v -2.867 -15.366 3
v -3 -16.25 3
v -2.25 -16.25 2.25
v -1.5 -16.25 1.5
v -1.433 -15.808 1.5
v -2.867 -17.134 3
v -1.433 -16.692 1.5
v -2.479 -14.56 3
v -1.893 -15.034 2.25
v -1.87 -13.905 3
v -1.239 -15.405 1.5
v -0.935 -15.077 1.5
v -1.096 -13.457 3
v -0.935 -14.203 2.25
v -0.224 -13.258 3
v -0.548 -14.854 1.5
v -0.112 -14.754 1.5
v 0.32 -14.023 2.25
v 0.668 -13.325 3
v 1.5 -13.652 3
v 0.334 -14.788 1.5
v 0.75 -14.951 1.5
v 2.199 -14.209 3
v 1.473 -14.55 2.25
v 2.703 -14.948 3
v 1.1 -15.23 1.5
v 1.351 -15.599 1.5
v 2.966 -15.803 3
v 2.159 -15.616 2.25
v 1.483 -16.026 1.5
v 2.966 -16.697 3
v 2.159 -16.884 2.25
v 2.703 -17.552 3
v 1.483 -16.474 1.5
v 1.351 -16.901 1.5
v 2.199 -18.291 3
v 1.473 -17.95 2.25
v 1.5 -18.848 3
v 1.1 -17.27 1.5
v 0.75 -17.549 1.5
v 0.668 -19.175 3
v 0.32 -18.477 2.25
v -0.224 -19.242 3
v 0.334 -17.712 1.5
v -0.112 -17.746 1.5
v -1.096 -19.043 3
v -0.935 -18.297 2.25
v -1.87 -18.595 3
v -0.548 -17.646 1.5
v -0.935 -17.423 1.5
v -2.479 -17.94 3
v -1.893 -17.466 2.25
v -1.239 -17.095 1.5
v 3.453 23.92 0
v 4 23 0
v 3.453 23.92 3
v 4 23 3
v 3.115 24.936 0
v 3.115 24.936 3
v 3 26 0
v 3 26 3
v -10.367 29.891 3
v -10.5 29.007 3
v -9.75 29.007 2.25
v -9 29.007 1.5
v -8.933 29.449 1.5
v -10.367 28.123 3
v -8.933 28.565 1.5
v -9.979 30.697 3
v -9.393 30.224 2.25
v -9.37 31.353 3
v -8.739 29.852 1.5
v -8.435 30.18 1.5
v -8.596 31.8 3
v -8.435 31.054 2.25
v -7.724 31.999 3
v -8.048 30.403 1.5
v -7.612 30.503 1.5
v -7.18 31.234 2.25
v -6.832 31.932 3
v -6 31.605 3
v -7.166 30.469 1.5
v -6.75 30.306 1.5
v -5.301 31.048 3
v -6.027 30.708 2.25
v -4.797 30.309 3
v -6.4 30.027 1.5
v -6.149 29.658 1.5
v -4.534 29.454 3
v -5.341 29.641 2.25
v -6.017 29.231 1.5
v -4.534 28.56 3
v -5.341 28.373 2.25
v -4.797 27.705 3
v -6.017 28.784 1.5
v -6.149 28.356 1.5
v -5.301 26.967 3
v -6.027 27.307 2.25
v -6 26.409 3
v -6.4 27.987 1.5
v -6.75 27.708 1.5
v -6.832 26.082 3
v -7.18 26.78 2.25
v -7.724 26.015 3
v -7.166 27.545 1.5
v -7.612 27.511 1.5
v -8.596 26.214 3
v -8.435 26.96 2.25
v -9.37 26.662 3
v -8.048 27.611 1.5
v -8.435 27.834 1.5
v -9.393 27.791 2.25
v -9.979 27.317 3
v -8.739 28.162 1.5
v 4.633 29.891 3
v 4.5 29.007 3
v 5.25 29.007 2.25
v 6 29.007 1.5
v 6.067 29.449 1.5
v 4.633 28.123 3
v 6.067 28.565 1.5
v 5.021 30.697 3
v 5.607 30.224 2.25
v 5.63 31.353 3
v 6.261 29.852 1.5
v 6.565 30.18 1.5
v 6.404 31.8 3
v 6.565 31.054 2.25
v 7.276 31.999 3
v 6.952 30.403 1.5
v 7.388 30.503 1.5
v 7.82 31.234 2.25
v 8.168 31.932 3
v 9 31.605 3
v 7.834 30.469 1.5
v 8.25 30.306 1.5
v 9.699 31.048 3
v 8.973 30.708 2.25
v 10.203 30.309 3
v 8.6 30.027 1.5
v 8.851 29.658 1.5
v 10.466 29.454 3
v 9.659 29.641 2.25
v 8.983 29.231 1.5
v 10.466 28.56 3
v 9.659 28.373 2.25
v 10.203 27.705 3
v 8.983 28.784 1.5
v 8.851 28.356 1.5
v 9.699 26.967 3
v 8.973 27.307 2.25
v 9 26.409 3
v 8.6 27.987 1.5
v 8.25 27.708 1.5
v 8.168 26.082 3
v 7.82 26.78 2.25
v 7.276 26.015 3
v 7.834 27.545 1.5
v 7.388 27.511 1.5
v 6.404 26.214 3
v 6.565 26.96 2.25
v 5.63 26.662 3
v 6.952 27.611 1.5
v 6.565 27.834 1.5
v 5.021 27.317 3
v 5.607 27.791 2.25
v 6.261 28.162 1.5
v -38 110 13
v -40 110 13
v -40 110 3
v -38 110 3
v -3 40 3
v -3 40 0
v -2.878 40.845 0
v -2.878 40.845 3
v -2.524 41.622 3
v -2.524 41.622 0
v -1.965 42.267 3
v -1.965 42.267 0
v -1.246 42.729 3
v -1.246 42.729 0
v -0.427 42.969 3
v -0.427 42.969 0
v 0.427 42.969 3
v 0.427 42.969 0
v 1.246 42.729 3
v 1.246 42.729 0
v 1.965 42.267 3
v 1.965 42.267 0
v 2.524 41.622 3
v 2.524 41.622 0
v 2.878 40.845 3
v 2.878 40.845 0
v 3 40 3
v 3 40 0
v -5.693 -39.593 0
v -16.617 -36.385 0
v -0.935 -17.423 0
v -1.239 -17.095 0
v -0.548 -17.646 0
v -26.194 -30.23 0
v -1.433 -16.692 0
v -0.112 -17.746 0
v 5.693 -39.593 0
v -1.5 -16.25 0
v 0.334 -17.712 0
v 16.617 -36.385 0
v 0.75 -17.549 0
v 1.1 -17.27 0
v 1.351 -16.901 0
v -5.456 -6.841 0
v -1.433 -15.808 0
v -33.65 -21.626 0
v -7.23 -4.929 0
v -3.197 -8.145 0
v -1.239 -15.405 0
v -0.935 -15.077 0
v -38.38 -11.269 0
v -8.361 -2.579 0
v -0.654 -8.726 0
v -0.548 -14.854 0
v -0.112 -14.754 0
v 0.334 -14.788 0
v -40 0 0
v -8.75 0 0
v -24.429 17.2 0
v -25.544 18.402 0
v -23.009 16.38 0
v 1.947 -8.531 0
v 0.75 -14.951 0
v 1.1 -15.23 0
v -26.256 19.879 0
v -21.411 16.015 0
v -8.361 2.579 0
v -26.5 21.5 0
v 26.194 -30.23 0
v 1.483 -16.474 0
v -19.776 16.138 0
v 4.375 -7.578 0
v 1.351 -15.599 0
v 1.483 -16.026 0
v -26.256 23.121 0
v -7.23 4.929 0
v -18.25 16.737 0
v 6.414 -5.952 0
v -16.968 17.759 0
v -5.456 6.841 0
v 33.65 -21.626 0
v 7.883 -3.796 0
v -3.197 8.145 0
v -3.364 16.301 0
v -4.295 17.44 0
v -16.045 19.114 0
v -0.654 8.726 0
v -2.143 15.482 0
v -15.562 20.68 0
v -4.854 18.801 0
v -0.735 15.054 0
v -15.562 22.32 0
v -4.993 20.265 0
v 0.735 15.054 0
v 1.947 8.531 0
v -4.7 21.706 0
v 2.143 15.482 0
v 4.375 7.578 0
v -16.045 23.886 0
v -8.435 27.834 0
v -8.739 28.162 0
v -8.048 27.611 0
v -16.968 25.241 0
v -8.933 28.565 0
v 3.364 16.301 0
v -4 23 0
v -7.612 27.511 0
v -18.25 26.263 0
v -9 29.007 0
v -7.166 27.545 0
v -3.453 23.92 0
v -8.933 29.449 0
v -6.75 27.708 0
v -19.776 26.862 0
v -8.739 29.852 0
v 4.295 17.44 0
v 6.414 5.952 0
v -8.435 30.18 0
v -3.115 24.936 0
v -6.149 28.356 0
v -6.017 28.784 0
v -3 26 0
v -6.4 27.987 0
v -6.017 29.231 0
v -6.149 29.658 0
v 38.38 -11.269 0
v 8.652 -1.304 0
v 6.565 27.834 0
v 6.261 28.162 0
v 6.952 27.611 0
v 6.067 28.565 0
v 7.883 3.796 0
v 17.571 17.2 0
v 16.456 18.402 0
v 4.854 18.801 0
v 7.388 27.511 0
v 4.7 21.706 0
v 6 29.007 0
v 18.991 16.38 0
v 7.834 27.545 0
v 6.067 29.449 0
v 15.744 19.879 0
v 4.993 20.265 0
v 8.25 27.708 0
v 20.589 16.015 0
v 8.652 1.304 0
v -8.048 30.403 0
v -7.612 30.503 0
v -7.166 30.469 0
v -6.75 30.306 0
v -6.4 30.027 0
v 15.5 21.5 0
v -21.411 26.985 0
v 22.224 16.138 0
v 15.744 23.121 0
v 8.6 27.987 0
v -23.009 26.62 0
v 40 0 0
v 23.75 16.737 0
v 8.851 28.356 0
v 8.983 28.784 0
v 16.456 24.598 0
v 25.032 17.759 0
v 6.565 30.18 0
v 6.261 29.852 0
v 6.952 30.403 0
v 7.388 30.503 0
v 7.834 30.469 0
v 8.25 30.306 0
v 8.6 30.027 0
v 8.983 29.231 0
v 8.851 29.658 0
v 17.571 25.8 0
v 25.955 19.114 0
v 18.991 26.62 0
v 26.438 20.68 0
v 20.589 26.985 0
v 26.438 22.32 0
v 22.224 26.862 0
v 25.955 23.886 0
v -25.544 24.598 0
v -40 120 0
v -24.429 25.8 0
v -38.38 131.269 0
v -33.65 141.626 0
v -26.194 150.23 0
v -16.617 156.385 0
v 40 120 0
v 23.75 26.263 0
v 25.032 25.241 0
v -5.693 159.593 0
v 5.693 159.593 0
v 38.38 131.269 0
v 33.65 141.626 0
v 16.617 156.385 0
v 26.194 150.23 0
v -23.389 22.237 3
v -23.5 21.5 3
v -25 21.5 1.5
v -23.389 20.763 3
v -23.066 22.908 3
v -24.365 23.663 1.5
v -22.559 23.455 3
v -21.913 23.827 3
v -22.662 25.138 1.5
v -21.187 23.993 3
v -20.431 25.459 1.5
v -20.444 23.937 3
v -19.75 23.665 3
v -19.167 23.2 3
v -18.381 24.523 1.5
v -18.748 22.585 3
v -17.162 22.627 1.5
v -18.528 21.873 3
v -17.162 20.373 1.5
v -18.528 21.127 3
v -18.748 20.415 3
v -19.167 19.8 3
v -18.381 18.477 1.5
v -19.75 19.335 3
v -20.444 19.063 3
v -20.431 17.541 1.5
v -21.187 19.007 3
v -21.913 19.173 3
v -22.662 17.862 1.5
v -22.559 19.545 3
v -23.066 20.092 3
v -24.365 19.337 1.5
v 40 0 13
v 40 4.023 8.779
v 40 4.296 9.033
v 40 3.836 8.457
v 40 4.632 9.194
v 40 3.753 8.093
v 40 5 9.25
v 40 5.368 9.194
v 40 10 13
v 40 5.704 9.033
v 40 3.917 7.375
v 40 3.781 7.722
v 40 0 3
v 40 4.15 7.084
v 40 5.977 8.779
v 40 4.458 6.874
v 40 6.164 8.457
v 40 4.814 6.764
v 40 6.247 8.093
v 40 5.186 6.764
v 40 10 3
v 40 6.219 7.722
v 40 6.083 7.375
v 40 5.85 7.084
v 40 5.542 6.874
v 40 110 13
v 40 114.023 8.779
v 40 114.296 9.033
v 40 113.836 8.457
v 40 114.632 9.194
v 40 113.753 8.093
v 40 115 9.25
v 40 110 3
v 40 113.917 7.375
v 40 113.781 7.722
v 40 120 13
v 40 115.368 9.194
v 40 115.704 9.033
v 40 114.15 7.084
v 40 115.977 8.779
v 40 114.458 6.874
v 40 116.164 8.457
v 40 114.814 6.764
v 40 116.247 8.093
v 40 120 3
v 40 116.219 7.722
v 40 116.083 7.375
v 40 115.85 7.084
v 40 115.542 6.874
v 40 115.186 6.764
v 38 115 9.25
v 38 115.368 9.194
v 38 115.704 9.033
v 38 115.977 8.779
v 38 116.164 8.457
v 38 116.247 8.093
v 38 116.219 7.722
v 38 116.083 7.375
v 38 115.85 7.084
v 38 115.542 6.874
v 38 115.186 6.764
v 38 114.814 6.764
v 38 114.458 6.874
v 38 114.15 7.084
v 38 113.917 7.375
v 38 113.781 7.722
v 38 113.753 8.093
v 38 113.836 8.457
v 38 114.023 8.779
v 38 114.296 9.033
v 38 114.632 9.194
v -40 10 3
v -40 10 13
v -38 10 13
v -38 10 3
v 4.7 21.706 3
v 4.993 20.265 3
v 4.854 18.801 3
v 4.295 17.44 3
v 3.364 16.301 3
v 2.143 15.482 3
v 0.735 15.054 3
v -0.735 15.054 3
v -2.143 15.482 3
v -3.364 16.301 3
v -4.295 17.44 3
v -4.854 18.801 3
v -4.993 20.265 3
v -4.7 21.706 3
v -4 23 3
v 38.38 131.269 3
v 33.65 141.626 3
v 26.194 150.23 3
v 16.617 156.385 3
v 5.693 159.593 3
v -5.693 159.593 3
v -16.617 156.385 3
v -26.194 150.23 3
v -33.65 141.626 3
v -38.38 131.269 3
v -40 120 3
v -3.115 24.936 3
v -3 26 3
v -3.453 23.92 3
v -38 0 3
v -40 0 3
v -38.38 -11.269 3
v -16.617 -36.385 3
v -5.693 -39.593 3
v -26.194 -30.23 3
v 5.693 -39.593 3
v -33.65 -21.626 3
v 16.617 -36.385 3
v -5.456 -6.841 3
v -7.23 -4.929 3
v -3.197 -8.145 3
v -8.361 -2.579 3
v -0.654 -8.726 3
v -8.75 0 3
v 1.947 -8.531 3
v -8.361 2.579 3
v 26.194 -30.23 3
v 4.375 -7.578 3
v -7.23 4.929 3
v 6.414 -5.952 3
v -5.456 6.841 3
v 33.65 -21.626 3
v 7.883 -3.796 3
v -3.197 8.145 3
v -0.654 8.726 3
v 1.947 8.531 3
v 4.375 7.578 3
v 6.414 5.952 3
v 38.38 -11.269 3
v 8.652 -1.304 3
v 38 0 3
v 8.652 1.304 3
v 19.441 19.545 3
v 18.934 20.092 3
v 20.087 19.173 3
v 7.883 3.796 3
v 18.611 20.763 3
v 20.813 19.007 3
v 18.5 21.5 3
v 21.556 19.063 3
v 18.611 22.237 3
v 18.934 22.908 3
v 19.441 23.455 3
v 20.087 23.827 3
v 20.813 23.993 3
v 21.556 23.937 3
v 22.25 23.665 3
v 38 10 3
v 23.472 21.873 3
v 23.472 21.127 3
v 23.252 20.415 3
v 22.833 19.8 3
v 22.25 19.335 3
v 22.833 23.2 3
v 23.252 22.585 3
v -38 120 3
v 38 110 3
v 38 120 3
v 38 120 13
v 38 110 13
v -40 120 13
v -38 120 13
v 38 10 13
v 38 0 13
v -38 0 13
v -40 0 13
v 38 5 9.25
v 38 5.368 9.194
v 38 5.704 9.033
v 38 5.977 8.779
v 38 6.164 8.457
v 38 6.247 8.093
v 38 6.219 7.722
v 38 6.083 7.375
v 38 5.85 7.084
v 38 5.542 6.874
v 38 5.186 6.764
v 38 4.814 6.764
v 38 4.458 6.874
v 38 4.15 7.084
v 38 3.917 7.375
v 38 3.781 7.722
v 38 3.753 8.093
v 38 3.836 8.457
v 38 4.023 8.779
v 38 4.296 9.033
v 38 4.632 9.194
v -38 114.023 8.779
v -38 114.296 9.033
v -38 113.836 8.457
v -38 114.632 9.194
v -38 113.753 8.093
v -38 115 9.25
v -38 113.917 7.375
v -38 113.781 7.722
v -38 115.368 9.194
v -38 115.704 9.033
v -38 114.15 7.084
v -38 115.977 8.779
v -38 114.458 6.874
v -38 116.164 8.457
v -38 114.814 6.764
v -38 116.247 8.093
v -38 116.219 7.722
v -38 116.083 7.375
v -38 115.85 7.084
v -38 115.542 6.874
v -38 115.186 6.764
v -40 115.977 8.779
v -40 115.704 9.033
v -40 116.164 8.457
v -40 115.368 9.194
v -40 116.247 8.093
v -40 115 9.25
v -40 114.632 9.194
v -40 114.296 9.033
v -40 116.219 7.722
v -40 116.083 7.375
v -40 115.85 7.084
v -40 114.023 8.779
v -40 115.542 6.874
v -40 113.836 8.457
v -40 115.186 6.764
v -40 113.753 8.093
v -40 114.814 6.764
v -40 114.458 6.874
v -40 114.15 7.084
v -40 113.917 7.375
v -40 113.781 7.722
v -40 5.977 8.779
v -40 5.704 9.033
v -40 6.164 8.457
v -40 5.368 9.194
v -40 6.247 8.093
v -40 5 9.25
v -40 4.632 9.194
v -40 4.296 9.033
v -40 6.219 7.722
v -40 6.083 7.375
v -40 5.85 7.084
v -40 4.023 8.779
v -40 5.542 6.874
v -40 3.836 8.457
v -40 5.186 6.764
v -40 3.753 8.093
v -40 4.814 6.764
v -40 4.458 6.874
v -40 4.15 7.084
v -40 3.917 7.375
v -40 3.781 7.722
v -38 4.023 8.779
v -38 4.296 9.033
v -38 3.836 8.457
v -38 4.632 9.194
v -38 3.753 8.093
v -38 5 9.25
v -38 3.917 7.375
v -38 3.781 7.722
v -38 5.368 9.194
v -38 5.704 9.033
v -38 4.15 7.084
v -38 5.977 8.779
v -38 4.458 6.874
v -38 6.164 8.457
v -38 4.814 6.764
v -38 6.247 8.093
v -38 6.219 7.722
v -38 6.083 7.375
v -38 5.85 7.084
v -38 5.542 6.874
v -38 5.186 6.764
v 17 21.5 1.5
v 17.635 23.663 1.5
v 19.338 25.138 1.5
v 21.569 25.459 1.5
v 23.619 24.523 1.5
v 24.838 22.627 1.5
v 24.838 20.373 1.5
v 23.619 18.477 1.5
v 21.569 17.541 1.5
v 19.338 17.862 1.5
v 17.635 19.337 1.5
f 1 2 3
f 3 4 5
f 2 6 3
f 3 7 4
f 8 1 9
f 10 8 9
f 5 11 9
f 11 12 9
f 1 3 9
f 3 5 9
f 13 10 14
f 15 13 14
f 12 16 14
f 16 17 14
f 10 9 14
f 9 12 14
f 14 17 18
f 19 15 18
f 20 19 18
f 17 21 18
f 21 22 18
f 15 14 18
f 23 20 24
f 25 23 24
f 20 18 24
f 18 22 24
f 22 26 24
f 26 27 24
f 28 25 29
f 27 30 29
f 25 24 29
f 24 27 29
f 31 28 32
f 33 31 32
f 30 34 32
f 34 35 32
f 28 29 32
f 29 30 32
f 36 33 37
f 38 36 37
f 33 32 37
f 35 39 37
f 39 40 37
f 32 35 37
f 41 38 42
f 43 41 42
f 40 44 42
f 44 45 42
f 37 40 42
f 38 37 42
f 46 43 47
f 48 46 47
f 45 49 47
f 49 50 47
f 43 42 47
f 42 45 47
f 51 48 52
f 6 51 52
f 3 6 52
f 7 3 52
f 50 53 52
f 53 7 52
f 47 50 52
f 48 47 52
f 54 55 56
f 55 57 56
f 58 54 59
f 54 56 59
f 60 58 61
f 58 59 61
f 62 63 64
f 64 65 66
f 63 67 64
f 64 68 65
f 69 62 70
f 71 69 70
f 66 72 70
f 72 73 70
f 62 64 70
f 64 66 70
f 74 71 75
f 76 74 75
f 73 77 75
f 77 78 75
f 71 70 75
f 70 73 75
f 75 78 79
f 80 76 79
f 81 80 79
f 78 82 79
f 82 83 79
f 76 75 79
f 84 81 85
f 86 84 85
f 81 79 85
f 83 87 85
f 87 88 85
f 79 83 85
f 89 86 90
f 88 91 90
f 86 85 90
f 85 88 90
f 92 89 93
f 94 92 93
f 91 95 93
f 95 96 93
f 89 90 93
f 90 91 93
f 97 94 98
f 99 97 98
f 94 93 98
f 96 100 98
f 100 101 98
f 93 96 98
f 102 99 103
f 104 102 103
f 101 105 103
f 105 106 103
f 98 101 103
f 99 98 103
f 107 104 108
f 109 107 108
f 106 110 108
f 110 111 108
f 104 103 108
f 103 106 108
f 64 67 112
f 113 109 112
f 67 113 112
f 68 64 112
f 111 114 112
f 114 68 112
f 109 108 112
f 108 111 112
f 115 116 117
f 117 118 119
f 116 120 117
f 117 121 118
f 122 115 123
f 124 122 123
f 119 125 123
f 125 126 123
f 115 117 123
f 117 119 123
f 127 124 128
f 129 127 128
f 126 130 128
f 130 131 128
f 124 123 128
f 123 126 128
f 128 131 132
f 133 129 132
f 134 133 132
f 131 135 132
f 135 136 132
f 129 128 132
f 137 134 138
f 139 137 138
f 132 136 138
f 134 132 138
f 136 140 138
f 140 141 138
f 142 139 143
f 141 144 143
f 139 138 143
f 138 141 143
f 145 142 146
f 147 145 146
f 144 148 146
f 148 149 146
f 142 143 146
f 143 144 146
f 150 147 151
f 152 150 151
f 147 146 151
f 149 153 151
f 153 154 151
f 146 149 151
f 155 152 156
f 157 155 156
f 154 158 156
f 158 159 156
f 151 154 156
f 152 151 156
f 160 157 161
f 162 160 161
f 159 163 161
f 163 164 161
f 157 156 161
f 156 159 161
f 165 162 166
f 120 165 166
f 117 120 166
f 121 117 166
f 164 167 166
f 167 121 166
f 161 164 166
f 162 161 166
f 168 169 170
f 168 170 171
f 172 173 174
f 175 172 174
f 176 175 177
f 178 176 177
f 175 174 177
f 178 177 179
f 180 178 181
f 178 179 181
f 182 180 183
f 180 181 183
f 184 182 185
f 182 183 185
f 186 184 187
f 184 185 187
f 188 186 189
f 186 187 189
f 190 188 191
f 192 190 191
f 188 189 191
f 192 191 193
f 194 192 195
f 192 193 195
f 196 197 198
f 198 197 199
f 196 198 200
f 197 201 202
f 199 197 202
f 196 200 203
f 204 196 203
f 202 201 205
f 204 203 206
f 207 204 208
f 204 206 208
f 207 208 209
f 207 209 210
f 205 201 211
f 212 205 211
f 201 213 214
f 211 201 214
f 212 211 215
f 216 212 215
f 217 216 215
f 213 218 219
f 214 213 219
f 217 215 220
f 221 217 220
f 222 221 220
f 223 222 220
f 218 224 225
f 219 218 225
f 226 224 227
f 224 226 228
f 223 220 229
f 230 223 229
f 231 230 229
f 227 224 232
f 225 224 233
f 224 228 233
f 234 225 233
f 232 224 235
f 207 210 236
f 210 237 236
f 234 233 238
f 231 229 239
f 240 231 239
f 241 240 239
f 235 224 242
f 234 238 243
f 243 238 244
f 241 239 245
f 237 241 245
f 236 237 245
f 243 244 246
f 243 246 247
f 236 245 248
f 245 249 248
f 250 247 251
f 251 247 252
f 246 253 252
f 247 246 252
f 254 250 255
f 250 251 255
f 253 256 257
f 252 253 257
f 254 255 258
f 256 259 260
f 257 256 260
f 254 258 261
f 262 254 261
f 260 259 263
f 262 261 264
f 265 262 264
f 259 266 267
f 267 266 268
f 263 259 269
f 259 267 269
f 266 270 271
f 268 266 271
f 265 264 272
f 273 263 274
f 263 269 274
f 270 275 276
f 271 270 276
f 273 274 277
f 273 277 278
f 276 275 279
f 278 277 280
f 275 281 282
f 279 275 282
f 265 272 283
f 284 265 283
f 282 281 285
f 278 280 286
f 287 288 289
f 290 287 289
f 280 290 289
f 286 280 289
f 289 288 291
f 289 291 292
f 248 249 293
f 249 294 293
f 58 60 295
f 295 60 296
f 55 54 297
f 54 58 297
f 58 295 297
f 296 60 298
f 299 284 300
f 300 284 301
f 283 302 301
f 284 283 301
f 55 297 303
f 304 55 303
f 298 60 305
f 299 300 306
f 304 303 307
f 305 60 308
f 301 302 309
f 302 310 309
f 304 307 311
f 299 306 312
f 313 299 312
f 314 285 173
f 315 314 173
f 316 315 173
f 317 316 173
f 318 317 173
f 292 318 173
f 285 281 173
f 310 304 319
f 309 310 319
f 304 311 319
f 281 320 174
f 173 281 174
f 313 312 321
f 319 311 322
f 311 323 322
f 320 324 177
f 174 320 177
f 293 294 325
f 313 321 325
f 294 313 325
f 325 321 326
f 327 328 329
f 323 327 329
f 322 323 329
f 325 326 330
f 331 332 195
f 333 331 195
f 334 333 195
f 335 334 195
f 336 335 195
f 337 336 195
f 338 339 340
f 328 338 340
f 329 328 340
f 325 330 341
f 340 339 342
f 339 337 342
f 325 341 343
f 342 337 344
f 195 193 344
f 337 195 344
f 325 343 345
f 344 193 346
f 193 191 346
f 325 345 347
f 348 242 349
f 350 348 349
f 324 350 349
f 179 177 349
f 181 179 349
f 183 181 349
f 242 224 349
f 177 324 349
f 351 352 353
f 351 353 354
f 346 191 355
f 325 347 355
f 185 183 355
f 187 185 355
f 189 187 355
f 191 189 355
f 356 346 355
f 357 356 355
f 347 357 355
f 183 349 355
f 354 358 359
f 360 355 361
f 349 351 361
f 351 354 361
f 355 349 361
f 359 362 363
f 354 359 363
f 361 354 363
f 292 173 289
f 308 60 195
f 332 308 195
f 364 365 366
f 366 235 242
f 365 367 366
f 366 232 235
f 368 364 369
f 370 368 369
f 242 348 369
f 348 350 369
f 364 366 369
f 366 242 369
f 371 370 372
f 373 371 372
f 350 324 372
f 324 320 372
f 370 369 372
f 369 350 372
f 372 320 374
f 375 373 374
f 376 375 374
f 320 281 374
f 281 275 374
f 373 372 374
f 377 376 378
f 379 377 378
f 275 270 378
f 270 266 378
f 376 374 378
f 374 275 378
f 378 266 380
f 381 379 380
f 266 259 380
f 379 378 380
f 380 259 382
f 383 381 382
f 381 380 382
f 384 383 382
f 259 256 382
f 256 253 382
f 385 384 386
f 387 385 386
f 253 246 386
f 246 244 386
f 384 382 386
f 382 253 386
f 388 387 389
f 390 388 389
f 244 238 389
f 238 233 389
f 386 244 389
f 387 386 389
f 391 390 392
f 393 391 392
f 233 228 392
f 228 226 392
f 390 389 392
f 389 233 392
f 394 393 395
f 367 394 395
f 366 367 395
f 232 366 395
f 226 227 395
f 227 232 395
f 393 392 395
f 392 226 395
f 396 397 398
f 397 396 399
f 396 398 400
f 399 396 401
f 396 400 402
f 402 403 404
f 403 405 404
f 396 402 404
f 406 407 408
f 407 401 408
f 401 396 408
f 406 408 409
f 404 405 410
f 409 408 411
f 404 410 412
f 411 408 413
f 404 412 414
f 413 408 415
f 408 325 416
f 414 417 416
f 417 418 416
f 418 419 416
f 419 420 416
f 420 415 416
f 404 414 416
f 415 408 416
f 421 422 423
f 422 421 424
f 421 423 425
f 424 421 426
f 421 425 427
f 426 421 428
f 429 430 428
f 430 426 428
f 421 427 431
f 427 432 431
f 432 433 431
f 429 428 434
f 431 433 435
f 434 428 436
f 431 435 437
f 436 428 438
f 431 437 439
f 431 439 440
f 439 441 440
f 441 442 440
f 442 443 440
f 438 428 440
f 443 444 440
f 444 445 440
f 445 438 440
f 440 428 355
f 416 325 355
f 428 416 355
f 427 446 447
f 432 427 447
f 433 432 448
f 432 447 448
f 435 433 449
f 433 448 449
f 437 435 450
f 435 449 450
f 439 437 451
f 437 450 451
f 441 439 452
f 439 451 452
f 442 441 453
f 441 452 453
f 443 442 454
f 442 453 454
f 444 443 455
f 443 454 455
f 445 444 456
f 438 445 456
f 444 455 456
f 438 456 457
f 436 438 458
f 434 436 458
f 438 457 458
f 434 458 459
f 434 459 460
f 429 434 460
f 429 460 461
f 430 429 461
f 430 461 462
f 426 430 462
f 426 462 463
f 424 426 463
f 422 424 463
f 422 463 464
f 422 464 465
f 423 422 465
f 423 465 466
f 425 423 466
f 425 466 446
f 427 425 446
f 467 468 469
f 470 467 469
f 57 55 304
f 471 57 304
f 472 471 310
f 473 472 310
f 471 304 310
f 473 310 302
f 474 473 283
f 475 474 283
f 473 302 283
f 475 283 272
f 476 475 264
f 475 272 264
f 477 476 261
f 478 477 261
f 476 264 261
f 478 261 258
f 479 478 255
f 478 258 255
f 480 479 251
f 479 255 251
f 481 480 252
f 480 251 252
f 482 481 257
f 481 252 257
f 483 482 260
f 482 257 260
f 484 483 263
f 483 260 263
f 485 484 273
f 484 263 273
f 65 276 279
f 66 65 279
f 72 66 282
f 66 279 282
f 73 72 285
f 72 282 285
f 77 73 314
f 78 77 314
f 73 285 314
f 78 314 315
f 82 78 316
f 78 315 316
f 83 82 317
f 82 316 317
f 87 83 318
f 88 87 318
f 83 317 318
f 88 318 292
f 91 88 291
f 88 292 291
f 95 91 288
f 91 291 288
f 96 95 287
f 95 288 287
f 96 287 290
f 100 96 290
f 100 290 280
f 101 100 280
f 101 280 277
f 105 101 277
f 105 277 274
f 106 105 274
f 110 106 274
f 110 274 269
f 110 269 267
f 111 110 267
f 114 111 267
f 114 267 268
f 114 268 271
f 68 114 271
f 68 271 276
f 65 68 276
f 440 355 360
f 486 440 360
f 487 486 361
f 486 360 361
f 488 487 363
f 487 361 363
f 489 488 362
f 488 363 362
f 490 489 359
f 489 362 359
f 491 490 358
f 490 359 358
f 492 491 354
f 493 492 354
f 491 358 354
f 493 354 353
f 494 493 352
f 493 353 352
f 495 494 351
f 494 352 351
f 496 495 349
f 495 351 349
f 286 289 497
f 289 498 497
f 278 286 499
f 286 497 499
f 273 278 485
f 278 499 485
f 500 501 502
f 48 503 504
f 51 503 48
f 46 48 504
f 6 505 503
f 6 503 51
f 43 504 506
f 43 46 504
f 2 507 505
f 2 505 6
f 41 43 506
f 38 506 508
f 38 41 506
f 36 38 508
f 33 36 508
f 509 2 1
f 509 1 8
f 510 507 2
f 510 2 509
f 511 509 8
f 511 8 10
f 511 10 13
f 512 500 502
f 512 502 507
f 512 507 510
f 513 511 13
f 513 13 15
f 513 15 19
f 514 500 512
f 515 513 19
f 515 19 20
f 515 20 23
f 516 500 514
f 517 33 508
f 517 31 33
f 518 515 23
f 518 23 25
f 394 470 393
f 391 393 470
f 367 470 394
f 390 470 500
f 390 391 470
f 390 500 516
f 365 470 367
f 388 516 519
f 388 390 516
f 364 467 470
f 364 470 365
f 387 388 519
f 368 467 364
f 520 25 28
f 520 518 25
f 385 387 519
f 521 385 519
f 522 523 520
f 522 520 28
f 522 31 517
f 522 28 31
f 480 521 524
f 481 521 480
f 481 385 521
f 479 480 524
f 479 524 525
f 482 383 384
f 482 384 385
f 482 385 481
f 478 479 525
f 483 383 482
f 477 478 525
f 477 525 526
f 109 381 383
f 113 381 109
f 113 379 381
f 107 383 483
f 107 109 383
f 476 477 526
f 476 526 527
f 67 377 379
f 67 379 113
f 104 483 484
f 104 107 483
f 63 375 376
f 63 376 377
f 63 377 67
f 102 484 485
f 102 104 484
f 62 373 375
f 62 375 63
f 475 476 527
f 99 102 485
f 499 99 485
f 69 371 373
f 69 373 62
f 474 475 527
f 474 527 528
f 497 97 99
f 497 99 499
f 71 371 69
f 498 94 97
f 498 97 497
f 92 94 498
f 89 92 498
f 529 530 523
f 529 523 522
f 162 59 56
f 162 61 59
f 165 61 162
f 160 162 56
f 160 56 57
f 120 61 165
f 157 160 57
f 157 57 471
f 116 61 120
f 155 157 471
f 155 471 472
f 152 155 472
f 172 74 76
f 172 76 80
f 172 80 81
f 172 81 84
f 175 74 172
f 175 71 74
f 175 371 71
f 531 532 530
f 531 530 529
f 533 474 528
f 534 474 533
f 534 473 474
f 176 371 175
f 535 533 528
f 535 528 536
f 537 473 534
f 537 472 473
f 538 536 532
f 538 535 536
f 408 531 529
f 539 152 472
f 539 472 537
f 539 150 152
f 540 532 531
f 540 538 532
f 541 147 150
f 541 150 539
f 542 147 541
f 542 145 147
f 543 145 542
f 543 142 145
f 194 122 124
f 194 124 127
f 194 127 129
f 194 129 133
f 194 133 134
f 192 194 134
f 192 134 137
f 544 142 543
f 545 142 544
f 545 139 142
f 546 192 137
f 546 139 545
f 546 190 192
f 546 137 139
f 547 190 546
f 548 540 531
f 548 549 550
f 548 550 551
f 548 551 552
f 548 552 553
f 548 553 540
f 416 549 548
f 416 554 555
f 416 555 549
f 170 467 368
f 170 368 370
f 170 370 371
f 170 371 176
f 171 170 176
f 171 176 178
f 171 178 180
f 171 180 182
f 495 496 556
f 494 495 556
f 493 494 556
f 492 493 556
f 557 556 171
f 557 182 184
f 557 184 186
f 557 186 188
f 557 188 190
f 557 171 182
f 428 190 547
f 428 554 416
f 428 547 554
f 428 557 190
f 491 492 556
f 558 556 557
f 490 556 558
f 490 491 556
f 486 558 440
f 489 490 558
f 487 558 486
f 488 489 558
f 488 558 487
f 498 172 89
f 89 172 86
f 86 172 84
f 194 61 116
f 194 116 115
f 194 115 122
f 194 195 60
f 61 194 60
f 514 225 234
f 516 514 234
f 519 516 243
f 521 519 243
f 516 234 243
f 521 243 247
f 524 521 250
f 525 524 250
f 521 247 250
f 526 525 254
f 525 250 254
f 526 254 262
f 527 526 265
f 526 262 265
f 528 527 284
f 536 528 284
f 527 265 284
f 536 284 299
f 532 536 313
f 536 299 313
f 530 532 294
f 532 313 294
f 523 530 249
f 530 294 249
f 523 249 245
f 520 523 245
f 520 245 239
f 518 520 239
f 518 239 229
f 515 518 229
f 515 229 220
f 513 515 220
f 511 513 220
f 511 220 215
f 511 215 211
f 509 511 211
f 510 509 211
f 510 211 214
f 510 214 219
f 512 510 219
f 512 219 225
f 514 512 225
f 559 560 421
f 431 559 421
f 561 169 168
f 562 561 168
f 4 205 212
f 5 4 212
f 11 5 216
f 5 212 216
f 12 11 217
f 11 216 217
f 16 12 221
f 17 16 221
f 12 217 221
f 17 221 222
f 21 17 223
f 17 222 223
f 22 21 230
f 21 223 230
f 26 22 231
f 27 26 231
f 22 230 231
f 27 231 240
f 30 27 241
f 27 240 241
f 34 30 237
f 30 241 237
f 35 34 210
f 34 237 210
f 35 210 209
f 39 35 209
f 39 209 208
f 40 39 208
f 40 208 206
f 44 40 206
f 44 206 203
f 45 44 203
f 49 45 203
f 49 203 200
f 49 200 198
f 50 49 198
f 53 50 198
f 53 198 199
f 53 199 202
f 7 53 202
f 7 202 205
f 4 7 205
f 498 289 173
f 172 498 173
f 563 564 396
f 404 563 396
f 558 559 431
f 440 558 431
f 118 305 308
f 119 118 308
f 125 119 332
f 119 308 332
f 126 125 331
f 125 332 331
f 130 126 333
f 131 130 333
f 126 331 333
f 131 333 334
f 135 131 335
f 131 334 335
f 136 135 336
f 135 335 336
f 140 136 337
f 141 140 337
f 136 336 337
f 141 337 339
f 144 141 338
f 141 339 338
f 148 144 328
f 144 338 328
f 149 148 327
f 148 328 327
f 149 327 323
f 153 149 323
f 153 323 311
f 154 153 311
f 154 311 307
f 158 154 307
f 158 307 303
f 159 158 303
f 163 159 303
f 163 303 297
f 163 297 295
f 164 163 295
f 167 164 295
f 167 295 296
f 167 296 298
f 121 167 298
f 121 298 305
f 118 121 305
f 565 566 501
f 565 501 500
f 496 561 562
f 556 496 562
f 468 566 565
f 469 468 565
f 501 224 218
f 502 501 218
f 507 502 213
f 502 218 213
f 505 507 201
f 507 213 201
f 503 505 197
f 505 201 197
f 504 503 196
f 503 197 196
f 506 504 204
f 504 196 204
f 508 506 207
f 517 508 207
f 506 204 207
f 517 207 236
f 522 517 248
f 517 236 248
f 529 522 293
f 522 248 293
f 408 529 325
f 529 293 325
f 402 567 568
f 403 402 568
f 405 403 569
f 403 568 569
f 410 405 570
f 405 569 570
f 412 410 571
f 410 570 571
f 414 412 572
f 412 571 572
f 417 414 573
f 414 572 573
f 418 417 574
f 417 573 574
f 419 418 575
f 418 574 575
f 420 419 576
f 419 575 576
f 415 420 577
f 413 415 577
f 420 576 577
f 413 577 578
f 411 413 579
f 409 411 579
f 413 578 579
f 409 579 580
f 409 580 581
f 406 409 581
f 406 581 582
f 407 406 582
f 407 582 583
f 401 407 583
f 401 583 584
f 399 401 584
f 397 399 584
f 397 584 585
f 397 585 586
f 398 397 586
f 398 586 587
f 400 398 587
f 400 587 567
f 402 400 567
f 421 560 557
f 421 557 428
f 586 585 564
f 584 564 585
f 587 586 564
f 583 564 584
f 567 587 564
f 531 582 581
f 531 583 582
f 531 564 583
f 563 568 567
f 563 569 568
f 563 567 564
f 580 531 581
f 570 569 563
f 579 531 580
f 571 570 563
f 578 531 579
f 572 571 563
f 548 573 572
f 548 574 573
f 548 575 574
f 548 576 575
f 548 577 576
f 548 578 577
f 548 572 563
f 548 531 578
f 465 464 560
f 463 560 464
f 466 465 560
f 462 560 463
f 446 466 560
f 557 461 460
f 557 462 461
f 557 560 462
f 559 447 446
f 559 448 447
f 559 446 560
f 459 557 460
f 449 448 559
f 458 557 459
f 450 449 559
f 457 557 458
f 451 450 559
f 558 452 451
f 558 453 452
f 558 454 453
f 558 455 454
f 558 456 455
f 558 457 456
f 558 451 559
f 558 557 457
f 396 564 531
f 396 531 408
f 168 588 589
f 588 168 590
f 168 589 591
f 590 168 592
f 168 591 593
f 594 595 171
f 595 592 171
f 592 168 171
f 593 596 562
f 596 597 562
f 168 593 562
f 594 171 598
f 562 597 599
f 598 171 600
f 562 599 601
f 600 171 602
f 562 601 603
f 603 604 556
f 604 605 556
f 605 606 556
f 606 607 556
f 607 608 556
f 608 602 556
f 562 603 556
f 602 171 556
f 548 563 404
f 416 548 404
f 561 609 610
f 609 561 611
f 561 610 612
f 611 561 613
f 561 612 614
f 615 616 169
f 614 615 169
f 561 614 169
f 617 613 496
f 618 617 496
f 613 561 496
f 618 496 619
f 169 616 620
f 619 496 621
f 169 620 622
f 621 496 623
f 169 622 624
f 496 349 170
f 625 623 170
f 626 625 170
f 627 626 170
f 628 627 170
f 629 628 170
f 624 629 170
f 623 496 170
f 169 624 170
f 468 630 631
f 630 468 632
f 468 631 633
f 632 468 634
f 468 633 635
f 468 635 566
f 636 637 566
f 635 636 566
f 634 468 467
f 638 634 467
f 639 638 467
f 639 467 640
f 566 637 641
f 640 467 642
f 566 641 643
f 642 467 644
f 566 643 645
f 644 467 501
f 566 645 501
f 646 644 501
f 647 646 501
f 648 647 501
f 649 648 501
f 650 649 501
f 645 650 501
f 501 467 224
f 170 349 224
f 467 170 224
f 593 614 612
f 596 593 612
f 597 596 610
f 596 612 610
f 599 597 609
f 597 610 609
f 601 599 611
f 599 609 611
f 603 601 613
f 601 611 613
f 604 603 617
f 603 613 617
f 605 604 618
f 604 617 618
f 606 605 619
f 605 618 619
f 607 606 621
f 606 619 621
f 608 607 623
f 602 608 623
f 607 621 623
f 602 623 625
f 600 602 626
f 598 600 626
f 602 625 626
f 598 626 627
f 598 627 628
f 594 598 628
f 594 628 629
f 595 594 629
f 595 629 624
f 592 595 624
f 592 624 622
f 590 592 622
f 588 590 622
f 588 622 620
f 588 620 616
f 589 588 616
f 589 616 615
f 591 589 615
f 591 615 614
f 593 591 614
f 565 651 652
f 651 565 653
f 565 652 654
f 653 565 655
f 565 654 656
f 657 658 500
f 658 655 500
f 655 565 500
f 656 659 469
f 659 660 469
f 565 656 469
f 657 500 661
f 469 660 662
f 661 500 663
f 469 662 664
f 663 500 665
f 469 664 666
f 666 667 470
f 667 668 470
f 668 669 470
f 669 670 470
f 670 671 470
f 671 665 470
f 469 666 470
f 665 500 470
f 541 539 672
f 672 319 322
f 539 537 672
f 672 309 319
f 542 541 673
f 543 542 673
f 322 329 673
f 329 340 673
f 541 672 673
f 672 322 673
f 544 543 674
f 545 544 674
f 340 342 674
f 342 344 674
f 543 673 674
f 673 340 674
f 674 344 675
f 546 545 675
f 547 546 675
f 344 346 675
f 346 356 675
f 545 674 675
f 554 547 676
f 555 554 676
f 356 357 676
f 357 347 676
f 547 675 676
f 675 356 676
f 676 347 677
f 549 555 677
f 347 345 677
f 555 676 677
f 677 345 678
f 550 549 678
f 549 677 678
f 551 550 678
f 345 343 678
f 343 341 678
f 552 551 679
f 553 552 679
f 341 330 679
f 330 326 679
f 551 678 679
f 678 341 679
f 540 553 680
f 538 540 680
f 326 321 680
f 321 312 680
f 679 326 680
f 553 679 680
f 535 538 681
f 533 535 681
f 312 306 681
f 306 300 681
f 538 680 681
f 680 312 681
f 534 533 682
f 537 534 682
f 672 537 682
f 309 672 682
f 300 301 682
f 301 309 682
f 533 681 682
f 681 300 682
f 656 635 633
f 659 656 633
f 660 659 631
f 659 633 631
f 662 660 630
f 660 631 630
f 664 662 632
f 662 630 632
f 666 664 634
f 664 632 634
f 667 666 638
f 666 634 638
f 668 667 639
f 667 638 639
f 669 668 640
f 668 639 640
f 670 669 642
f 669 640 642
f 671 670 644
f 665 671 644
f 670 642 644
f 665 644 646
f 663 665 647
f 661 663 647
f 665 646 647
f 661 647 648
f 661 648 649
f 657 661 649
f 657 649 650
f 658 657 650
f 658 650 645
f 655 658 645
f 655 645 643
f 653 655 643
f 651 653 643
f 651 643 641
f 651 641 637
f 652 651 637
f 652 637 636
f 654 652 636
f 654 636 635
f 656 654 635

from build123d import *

# Parameters (mm, degrees)
SKETCH3_R           = 40
BOSS_EXTRUDE4_DEPTH = 3
SKETCH6_R           = 1.5
SKETCH6_R_2         = 8.75
CUT_EXTRUDE2_DEPTH  = 165.951508026
CHAMFER1_SIZE       = 1.5
SKETCH12_W          = 2
SKETCH12_H          = 10
BOSS_EXTRUDE7_DEPTH = 10
SKETCH13_R          = 1.25
CUT_EXTRUDE8_DEPTH  = 180.357185527
SKETCH14_R          = 2.5
CUT_EXTRUDE9_DEPTH  = 166.435788148
CHAMFER2_SIZE       = 3
CUT_EXTRUDE10_DEPTH = 166.435788148
FILLET1_R           = 5


with BuildPart() as part:
    # Sketch3 → Boss-Extrude4 (new body)
    with BuildSketch(Plane.XY):
        with BuildLine():
            ThreePointArc((40, 0), (0, 40), (-40, 0))
            Line((-40, 0), (40, 0))
        make_face()
        with BuildLine():
            Line((40, 0), (-40, 0))
            ThreePointArc((-40, 0), (0, -40), (40, 0))
        make_face()
        with BuildLine():
            Line((-40, 120), (-40, 0))
            ThreePointArc((-40, 0), (0, 40), (40, 0))
            Line((40, 0), (40, 120))
            ThreePointArc((40, 120), (0, 80), (-40, 120))
        make_face()
        with Locations((0, 120)):
            Circle(SKETCH3_R)
    extrude(amount=BOSS_EXTRUDE4_DEPTH)

    # Sketch6 → Cut-Extrude2 (cut, through all)
    with BuildSketch(Plane(origin=(0, 0, 0), x_dir=(-1, 0, 0), z_dir=(0, 0, -1))):
        with Locations((-7.5, 29.007101127)):
            Circle(SKETCH6_R)
        with Locations((7.5, 29.007101127)):
            Circle(SKETCH6_R)
        with Locations((0, -16.25)):
            Circle(SKETCH6_R)
        Circle(SKETCH6_R_2)
    extrude(amount=-CUT_EXTRUDE2_DEPTH, mode=Mode.SUBTRACT)

    # Chamfer1
    chamfer1_edges = [part.edges().sort_by_distance(p)[0] for p in [
        (-6, 29.007101127, 3),
        (1.5, -16.25, 3),
        (9, 29.007101127, 3),
    ]]
    chamfer(chamfer1_edges, length=CHAMFER1_SIZE)

    # Sketch12 → Boss-Extrude7 (add)
    with BuildSketch(Plane.XY.offset(3)):
        with Locations((39, 115)):
            Rectangle(SKETCH12_W, SKETCH12_H)
        with Locations((-39, 115)):
            Rectangle(SKETCH12_W, SKETCH12_H)
        with Locations((-39, 5)):
            Rectangle(SKETCH12_W, SKETCH12_H)
        with Locations((39, 5)):
            Rectangle(SKETCH12_W, SKETCH12_H)
    extrude(amount=BOSS_EXTRUDE7_DEPTH)

    # Sketch13 → Cut-Extrude8 (cut, through all)
    with BuildSketch(Plane.ZY.offset(40)):
        with Locations((8, 115)):
            Circle(SKETCH13_R)
        with Locations((8, 5)):
            Circle(SKETCH13_R)
    extrude(amount=-CUT_EXTRUDE8_DEPTH, mode=Mode.SUBTRACT)

    # Sketch14 → Cut-Extrude9 (cut, through all)
    with BuildSketch(Plane(origin=(0, 0, 0), x_dir=(-1, 0, 0), z_dir=(0, 0, -1))):
        with Locations((-21, 21.5)):
            Circle(SKETCH14_R)
        with Locations((21, 21.5)):
            Circle(SKETCH14_R)
    extrude(amount=-CUT_EXTRUDE9_DEPTH, mode=Mode.SUBTRACT)

    # Chamfer2
    chamfer2_edges = [part.edges().sort_by_distance(p)[0] for p in [
        (23.5, 21.5, 0),
        (-18.5, 21.5, 0),
    ]]
    chamfer(chamfer2_edges, length=CHAMFER2_SIZE - 0.0001)  # a hair under: the kernel refuses the full size

    # Sketch9 → Cut-Extrude10 (cut, through all)
    with BuildSketch(Plane(origin=(0, 0, 0), x_dir=(-1, 0, 0), z_dir=(0, 0, -1))):
        with BuildLine():
            ThreePointArc((3, 40), (0, 43), (-3, 40))
            Line((-3, 40), (-3, 24))
            ThreePointArc((-3, 24), (0, 15), (3, 24))
            Line((3, 24), (3, 40))
        make_face()
    extrude(amount=-CUT_EXTRUDE10_DEPTH, mode=Mode.SUBTRACT)

    # Fillet1
    fillet1_edges = [part.edges().sort_by_distance(p)[0] for p in [
        (3, 24, 1.5),
        (-3, 24, 1.5),
    ]]
    fillet(fillet1_edges, radius=FILLET1_R)


solid = part.part
